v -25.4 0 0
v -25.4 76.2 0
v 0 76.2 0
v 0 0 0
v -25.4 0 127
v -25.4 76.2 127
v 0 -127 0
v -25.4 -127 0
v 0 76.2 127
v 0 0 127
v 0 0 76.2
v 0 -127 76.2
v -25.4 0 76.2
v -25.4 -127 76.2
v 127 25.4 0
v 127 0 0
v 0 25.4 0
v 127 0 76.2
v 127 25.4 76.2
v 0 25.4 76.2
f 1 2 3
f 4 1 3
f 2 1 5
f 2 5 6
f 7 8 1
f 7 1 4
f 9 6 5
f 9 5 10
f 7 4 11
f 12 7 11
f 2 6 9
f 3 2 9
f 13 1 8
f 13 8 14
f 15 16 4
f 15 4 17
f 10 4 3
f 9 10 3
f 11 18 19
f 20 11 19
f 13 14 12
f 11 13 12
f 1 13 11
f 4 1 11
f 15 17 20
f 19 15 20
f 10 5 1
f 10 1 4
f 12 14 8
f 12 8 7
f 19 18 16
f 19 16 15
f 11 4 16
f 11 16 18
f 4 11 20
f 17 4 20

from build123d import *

# Parameters (mm, degrees)
F0_W     = 25.4
F0_H     = 76.2
F1_DEPTH = 127
F2_W     = 25.4
F2_H     = 76.2
F3_DEPTH = 127
F4_W     = 25.4
F4_H     = 76.2
F5_DEPTH = 127


with BuildPart() as f1:
    # F0 (on Right) → F1 (new body)
    with BuildSketch(Plane.YZ):
        with Locations((12.7, 38.1)):
            Rectangle(F0_W, F0_H)
    extrude(amount=F1_DEPTH)


with BuildPart() as f3:
    # F2 (on Front) → F3 (new body)
    with BuildSketch(Plane.XZ):
        with Locations((-12.7, 38.1)):
            Rectangle(F2_W, F2_H)
    extrude(amount=F3_DEPTH)


with BuildPart() as f5:
    # F4 (on Top) → F5 (new body)
    with BuildSketch(Plane.XY):
        with Locations((-12.7, 38.1)):
            Rectangle(F4_W, F4_H)
    extrude(amount=F5_DEPTH)


solid = Compound([f1.part, f3.part, f5.part])
